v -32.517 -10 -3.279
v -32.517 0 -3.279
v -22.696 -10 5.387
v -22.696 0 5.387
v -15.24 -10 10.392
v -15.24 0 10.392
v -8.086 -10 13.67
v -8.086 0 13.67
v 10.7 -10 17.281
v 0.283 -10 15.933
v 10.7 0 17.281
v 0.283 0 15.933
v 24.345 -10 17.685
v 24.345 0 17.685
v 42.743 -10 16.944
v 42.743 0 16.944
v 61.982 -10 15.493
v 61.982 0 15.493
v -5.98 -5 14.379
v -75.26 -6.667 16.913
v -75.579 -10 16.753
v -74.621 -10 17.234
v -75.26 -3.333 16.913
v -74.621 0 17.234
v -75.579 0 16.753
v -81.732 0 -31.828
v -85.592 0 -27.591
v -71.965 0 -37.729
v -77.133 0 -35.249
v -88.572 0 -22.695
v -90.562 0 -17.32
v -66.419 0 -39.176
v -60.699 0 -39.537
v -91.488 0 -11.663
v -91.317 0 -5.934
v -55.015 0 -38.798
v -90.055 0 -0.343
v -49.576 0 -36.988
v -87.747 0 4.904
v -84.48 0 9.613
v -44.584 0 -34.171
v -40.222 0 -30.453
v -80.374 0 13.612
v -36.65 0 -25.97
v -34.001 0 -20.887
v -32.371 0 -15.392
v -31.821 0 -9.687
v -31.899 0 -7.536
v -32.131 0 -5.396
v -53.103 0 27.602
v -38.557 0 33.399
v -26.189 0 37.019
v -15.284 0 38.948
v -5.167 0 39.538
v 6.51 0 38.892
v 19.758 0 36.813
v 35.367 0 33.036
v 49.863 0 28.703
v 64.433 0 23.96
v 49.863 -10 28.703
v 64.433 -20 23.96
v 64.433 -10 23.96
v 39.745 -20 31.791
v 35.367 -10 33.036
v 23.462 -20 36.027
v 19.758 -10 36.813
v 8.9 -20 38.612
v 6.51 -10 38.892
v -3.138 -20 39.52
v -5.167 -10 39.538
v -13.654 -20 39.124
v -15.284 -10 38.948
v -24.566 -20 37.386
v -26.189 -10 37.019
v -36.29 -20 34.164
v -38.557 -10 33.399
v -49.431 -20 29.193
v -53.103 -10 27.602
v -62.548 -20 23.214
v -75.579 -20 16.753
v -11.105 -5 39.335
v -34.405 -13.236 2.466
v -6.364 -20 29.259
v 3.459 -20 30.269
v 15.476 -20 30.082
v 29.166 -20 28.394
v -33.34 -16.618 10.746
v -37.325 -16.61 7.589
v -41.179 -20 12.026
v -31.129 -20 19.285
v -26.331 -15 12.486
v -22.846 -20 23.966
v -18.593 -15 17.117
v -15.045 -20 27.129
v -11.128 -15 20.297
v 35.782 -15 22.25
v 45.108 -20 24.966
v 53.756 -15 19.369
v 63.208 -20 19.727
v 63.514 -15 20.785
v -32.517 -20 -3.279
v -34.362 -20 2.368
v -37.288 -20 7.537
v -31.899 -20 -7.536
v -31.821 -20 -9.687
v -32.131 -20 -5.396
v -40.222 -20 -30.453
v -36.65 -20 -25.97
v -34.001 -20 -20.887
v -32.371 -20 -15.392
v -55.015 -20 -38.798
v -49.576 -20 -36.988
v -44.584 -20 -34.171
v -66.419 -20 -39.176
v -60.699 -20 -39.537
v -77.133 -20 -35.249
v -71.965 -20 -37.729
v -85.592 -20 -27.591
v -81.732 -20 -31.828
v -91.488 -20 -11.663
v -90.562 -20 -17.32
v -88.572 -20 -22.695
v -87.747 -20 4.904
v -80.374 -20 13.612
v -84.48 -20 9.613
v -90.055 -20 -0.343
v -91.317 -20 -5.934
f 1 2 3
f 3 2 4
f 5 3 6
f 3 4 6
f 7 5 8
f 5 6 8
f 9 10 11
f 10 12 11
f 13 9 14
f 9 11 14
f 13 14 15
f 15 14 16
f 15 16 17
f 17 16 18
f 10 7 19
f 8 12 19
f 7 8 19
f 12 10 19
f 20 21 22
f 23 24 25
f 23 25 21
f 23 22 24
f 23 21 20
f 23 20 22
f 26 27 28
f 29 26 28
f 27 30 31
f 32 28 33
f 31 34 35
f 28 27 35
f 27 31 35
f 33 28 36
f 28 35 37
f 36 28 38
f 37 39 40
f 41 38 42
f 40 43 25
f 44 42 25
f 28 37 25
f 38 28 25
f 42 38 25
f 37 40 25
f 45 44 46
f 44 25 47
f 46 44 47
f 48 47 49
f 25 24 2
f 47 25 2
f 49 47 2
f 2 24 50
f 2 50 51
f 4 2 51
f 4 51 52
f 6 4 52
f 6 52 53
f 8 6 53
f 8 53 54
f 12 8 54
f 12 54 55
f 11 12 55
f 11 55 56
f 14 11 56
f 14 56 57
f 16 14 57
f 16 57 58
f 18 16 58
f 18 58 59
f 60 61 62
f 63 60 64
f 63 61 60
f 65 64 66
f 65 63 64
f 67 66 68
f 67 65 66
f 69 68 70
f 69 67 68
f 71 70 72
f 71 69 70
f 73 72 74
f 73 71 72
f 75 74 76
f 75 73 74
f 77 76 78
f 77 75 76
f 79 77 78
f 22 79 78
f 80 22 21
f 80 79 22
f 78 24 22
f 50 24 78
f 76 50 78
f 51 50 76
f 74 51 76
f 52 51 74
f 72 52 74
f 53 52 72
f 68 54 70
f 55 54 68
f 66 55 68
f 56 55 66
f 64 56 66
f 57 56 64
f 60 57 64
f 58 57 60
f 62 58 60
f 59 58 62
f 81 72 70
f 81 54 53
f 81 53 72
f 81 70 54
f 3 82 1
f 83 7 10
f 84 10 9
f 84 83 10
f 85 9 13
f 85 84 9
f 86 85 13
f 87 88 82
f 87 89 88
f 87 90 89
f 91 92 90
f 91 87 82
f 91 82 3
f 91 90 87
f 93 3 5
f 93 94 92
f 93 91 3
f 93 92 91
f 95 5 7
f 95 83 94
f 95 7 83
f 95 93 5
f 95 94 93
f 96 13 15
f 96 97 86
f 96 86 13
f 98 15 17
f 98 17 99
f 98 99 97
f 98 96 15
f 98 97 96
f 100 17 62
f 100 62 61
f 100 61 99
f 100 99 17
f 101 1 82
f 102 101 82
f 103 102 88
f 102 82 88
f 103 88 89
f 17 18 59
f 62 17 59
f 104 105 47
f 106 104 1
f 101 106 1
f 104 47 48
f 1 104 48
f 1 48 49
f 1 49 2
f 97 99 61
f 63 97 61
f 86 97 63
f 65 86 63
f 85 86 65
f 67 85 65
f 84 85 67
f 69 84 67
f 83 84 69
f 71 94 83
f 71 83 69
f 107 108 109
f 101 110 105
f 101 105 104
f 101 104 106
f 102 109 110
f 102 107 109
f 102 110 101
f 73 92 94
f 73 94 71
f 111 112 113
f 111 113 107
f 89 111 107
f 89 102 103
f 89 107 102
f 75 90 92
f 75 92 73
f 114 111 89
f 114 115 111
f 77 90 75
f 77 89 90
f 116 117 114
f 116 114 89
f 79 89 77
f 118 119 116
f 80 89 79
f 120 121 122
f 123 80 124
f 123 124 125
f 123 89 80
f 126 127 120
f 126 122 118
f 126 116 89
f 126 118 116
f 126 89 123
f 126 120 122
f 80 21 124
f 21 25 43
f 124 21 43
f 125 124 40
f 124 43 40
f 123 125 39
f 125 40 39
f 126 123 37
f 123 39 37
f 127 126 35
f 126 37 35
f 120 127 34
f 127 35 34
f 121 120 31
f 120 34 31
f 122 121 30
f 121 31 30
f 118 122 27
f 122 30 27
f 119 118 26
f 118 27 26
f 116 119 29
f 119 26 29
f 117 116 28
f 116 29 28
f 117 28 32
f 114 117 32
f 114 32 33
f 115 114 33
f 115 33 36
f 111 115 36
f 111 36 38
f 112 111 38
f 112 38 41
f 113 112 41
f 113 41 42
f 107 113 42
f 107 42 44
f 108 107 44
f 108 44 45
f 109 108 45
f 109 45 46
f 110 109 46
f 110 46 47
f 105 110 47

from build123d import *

# Parameters (mm, degrees)
F6_DEPTH = 10
F7_DEPTH = 20


# Not quite as in the source:
# - the dataset's text gives a spline's control points without its knots; the knots are read off the source's solid


with BuildPart() as f5:
    # F3 (on offset) → F5 section 0
    with BuildSketch(Plane.XZ.offset(10)):
        with BuildLine():
            ThreePointArc((-75.5787535417, 16.7525420321), (-74.2842309522, -36.7668523877), (-32.5165676908, -3.2785906609))
            add(Edge.make_bspline(
                [(-32.5165676908, -3.2785906609), (-25.0186225888, 3.7525831829), (-6.6027990329, 21.0474968683), (36.4369216658, 17.5617465832), (61.9822815061, 15.4927987605)],
                knots=[0, 0, 0, 0, 0.406452044, 1, 1, 1, 1], degree=3))
            Line((61.9822815061, 15.4927987605), (64.4333958626, 23.9602774382))
            add(Edge.make_bspline(
                [(-75.5787535417, 16.7525420321), (-54.628951456, 27.285399841), (-11.406645731, 48.9685404457), (38.647869417, 32.4670255034), (64.4333958626, 23.9602774382)],
                knots=[0, 0, 0, 0, 0.4849009259, 1, 1, 1, 1], degree=3))
        make_face()
    # F4 (on offset) → F5 section 1
    with BuildSketch(Plane.XZ.offset(20)):
        with BuildLine():
            add(Edge.make_bspline(
                [(-75.5787535417, 16.7525420321), (-54.628951456, 27.285399841), (-11.406645731, 48.9685404457), (38.647869417, 32.4670255034), (64.4333958626, 23.9602774382)],
                knots=[0, 0, 0, 0, 0.4849009259, 1, 1, 1, 1], degree=3))
            ThreePointArc((-75.5787535417, 16.7525420321), (-65.7534042192, -39.2752402765), (-41.1793711539, 12.0255080478))
            add(Edge.make_bspline(
                [(-41.1793711539, 12.0255080478), (-25.2502910967, 24.6854926251), (-0.0760708598, 33.9443363857), (36.1576432322, 28.3926800744), (63.2078386843, 19.7265380993)],
                knots=[0, 0, 0, 0, 0.4558632428, 1, 1, 1, 1], degree=3))
            Line((63.2078386843, 19.7265380993), (64.4333958626, 23.9602774382))
        make_face()
    loft()

    # F0 (on Front) → F6 (join)
    with BuildSketch(Plane.XZ):
        with BuildLine():
            ThreePointArc((-74.6210650057, 17.2339850929), (-48.6067992872, 17.1628264037), (-32.5165676908, -3.2785906609))
            add(Edge.make_bspline(
                [(-32.5165676908, -3.2785906609), (-25.0186225888, 3.7525831829), (-6.6027990329, 21.0474968683), (36.4369216658, 17.5617465832), (61.9822815061, 15.4927987605)],
                knots=[0, 0, 0, 0, 0.406452044, 1, 1, 1, 1], degree=3))
            Line((61.9822815061, 15.4927987605), (64.4333958626, 23.9602774382))
            add(Edge.make_bspline(
                [(-74.6210650057, 17.2339850929), (-53.9898610909, 27.6037376874), (-11.0368055784, 48.8466149254), (38.647869417, 32.4670255034), (64.4333958626, 23.9602774382)],
                knots=[0.0073887471, 0.0073887471, 0.0073887471, 0.0073887471, 0.4849009259, 1, 1, 1, 1], degree=3))
        make_face()
    extrude(amount=F6_DEPTH)

    # F0 (on Front) → F7 (join)
    with BuildSketch(Plane.XZ):
        with BuildLine():
            ThreePointArc((-75.5787535417, 16.7525420321), (-77.1329137918, -35.2493874652), (-31.8209869176, -9.6868099645))
            ThreePointArc((-31.8209869176, -9.6868099645), (-31.9953913254, -6.4638801151), (-32.5165676908, -3.2785906609))
            ThreePointArc((-32.5165676908, -3.2785906609), (-48.6067992872, 17.1628264037), (-74.6210650057, 17.2339850929))
            add(Edge.make_bspline(
                [(-75.5787535417, 16.7525420321), (-75.2595279418, 16.9130379566), (-74.940300314, 17.0735295431), (-74.6210650057, 17.2339850929)],
                knots=[0, 0, 0, 0, 0.0073887471, 0.0073887471, 0.0073887471, 0.0073887471], degree=3))
        make_face()
    extrude(amount=F7_DEPTH)


solid = f5.part
